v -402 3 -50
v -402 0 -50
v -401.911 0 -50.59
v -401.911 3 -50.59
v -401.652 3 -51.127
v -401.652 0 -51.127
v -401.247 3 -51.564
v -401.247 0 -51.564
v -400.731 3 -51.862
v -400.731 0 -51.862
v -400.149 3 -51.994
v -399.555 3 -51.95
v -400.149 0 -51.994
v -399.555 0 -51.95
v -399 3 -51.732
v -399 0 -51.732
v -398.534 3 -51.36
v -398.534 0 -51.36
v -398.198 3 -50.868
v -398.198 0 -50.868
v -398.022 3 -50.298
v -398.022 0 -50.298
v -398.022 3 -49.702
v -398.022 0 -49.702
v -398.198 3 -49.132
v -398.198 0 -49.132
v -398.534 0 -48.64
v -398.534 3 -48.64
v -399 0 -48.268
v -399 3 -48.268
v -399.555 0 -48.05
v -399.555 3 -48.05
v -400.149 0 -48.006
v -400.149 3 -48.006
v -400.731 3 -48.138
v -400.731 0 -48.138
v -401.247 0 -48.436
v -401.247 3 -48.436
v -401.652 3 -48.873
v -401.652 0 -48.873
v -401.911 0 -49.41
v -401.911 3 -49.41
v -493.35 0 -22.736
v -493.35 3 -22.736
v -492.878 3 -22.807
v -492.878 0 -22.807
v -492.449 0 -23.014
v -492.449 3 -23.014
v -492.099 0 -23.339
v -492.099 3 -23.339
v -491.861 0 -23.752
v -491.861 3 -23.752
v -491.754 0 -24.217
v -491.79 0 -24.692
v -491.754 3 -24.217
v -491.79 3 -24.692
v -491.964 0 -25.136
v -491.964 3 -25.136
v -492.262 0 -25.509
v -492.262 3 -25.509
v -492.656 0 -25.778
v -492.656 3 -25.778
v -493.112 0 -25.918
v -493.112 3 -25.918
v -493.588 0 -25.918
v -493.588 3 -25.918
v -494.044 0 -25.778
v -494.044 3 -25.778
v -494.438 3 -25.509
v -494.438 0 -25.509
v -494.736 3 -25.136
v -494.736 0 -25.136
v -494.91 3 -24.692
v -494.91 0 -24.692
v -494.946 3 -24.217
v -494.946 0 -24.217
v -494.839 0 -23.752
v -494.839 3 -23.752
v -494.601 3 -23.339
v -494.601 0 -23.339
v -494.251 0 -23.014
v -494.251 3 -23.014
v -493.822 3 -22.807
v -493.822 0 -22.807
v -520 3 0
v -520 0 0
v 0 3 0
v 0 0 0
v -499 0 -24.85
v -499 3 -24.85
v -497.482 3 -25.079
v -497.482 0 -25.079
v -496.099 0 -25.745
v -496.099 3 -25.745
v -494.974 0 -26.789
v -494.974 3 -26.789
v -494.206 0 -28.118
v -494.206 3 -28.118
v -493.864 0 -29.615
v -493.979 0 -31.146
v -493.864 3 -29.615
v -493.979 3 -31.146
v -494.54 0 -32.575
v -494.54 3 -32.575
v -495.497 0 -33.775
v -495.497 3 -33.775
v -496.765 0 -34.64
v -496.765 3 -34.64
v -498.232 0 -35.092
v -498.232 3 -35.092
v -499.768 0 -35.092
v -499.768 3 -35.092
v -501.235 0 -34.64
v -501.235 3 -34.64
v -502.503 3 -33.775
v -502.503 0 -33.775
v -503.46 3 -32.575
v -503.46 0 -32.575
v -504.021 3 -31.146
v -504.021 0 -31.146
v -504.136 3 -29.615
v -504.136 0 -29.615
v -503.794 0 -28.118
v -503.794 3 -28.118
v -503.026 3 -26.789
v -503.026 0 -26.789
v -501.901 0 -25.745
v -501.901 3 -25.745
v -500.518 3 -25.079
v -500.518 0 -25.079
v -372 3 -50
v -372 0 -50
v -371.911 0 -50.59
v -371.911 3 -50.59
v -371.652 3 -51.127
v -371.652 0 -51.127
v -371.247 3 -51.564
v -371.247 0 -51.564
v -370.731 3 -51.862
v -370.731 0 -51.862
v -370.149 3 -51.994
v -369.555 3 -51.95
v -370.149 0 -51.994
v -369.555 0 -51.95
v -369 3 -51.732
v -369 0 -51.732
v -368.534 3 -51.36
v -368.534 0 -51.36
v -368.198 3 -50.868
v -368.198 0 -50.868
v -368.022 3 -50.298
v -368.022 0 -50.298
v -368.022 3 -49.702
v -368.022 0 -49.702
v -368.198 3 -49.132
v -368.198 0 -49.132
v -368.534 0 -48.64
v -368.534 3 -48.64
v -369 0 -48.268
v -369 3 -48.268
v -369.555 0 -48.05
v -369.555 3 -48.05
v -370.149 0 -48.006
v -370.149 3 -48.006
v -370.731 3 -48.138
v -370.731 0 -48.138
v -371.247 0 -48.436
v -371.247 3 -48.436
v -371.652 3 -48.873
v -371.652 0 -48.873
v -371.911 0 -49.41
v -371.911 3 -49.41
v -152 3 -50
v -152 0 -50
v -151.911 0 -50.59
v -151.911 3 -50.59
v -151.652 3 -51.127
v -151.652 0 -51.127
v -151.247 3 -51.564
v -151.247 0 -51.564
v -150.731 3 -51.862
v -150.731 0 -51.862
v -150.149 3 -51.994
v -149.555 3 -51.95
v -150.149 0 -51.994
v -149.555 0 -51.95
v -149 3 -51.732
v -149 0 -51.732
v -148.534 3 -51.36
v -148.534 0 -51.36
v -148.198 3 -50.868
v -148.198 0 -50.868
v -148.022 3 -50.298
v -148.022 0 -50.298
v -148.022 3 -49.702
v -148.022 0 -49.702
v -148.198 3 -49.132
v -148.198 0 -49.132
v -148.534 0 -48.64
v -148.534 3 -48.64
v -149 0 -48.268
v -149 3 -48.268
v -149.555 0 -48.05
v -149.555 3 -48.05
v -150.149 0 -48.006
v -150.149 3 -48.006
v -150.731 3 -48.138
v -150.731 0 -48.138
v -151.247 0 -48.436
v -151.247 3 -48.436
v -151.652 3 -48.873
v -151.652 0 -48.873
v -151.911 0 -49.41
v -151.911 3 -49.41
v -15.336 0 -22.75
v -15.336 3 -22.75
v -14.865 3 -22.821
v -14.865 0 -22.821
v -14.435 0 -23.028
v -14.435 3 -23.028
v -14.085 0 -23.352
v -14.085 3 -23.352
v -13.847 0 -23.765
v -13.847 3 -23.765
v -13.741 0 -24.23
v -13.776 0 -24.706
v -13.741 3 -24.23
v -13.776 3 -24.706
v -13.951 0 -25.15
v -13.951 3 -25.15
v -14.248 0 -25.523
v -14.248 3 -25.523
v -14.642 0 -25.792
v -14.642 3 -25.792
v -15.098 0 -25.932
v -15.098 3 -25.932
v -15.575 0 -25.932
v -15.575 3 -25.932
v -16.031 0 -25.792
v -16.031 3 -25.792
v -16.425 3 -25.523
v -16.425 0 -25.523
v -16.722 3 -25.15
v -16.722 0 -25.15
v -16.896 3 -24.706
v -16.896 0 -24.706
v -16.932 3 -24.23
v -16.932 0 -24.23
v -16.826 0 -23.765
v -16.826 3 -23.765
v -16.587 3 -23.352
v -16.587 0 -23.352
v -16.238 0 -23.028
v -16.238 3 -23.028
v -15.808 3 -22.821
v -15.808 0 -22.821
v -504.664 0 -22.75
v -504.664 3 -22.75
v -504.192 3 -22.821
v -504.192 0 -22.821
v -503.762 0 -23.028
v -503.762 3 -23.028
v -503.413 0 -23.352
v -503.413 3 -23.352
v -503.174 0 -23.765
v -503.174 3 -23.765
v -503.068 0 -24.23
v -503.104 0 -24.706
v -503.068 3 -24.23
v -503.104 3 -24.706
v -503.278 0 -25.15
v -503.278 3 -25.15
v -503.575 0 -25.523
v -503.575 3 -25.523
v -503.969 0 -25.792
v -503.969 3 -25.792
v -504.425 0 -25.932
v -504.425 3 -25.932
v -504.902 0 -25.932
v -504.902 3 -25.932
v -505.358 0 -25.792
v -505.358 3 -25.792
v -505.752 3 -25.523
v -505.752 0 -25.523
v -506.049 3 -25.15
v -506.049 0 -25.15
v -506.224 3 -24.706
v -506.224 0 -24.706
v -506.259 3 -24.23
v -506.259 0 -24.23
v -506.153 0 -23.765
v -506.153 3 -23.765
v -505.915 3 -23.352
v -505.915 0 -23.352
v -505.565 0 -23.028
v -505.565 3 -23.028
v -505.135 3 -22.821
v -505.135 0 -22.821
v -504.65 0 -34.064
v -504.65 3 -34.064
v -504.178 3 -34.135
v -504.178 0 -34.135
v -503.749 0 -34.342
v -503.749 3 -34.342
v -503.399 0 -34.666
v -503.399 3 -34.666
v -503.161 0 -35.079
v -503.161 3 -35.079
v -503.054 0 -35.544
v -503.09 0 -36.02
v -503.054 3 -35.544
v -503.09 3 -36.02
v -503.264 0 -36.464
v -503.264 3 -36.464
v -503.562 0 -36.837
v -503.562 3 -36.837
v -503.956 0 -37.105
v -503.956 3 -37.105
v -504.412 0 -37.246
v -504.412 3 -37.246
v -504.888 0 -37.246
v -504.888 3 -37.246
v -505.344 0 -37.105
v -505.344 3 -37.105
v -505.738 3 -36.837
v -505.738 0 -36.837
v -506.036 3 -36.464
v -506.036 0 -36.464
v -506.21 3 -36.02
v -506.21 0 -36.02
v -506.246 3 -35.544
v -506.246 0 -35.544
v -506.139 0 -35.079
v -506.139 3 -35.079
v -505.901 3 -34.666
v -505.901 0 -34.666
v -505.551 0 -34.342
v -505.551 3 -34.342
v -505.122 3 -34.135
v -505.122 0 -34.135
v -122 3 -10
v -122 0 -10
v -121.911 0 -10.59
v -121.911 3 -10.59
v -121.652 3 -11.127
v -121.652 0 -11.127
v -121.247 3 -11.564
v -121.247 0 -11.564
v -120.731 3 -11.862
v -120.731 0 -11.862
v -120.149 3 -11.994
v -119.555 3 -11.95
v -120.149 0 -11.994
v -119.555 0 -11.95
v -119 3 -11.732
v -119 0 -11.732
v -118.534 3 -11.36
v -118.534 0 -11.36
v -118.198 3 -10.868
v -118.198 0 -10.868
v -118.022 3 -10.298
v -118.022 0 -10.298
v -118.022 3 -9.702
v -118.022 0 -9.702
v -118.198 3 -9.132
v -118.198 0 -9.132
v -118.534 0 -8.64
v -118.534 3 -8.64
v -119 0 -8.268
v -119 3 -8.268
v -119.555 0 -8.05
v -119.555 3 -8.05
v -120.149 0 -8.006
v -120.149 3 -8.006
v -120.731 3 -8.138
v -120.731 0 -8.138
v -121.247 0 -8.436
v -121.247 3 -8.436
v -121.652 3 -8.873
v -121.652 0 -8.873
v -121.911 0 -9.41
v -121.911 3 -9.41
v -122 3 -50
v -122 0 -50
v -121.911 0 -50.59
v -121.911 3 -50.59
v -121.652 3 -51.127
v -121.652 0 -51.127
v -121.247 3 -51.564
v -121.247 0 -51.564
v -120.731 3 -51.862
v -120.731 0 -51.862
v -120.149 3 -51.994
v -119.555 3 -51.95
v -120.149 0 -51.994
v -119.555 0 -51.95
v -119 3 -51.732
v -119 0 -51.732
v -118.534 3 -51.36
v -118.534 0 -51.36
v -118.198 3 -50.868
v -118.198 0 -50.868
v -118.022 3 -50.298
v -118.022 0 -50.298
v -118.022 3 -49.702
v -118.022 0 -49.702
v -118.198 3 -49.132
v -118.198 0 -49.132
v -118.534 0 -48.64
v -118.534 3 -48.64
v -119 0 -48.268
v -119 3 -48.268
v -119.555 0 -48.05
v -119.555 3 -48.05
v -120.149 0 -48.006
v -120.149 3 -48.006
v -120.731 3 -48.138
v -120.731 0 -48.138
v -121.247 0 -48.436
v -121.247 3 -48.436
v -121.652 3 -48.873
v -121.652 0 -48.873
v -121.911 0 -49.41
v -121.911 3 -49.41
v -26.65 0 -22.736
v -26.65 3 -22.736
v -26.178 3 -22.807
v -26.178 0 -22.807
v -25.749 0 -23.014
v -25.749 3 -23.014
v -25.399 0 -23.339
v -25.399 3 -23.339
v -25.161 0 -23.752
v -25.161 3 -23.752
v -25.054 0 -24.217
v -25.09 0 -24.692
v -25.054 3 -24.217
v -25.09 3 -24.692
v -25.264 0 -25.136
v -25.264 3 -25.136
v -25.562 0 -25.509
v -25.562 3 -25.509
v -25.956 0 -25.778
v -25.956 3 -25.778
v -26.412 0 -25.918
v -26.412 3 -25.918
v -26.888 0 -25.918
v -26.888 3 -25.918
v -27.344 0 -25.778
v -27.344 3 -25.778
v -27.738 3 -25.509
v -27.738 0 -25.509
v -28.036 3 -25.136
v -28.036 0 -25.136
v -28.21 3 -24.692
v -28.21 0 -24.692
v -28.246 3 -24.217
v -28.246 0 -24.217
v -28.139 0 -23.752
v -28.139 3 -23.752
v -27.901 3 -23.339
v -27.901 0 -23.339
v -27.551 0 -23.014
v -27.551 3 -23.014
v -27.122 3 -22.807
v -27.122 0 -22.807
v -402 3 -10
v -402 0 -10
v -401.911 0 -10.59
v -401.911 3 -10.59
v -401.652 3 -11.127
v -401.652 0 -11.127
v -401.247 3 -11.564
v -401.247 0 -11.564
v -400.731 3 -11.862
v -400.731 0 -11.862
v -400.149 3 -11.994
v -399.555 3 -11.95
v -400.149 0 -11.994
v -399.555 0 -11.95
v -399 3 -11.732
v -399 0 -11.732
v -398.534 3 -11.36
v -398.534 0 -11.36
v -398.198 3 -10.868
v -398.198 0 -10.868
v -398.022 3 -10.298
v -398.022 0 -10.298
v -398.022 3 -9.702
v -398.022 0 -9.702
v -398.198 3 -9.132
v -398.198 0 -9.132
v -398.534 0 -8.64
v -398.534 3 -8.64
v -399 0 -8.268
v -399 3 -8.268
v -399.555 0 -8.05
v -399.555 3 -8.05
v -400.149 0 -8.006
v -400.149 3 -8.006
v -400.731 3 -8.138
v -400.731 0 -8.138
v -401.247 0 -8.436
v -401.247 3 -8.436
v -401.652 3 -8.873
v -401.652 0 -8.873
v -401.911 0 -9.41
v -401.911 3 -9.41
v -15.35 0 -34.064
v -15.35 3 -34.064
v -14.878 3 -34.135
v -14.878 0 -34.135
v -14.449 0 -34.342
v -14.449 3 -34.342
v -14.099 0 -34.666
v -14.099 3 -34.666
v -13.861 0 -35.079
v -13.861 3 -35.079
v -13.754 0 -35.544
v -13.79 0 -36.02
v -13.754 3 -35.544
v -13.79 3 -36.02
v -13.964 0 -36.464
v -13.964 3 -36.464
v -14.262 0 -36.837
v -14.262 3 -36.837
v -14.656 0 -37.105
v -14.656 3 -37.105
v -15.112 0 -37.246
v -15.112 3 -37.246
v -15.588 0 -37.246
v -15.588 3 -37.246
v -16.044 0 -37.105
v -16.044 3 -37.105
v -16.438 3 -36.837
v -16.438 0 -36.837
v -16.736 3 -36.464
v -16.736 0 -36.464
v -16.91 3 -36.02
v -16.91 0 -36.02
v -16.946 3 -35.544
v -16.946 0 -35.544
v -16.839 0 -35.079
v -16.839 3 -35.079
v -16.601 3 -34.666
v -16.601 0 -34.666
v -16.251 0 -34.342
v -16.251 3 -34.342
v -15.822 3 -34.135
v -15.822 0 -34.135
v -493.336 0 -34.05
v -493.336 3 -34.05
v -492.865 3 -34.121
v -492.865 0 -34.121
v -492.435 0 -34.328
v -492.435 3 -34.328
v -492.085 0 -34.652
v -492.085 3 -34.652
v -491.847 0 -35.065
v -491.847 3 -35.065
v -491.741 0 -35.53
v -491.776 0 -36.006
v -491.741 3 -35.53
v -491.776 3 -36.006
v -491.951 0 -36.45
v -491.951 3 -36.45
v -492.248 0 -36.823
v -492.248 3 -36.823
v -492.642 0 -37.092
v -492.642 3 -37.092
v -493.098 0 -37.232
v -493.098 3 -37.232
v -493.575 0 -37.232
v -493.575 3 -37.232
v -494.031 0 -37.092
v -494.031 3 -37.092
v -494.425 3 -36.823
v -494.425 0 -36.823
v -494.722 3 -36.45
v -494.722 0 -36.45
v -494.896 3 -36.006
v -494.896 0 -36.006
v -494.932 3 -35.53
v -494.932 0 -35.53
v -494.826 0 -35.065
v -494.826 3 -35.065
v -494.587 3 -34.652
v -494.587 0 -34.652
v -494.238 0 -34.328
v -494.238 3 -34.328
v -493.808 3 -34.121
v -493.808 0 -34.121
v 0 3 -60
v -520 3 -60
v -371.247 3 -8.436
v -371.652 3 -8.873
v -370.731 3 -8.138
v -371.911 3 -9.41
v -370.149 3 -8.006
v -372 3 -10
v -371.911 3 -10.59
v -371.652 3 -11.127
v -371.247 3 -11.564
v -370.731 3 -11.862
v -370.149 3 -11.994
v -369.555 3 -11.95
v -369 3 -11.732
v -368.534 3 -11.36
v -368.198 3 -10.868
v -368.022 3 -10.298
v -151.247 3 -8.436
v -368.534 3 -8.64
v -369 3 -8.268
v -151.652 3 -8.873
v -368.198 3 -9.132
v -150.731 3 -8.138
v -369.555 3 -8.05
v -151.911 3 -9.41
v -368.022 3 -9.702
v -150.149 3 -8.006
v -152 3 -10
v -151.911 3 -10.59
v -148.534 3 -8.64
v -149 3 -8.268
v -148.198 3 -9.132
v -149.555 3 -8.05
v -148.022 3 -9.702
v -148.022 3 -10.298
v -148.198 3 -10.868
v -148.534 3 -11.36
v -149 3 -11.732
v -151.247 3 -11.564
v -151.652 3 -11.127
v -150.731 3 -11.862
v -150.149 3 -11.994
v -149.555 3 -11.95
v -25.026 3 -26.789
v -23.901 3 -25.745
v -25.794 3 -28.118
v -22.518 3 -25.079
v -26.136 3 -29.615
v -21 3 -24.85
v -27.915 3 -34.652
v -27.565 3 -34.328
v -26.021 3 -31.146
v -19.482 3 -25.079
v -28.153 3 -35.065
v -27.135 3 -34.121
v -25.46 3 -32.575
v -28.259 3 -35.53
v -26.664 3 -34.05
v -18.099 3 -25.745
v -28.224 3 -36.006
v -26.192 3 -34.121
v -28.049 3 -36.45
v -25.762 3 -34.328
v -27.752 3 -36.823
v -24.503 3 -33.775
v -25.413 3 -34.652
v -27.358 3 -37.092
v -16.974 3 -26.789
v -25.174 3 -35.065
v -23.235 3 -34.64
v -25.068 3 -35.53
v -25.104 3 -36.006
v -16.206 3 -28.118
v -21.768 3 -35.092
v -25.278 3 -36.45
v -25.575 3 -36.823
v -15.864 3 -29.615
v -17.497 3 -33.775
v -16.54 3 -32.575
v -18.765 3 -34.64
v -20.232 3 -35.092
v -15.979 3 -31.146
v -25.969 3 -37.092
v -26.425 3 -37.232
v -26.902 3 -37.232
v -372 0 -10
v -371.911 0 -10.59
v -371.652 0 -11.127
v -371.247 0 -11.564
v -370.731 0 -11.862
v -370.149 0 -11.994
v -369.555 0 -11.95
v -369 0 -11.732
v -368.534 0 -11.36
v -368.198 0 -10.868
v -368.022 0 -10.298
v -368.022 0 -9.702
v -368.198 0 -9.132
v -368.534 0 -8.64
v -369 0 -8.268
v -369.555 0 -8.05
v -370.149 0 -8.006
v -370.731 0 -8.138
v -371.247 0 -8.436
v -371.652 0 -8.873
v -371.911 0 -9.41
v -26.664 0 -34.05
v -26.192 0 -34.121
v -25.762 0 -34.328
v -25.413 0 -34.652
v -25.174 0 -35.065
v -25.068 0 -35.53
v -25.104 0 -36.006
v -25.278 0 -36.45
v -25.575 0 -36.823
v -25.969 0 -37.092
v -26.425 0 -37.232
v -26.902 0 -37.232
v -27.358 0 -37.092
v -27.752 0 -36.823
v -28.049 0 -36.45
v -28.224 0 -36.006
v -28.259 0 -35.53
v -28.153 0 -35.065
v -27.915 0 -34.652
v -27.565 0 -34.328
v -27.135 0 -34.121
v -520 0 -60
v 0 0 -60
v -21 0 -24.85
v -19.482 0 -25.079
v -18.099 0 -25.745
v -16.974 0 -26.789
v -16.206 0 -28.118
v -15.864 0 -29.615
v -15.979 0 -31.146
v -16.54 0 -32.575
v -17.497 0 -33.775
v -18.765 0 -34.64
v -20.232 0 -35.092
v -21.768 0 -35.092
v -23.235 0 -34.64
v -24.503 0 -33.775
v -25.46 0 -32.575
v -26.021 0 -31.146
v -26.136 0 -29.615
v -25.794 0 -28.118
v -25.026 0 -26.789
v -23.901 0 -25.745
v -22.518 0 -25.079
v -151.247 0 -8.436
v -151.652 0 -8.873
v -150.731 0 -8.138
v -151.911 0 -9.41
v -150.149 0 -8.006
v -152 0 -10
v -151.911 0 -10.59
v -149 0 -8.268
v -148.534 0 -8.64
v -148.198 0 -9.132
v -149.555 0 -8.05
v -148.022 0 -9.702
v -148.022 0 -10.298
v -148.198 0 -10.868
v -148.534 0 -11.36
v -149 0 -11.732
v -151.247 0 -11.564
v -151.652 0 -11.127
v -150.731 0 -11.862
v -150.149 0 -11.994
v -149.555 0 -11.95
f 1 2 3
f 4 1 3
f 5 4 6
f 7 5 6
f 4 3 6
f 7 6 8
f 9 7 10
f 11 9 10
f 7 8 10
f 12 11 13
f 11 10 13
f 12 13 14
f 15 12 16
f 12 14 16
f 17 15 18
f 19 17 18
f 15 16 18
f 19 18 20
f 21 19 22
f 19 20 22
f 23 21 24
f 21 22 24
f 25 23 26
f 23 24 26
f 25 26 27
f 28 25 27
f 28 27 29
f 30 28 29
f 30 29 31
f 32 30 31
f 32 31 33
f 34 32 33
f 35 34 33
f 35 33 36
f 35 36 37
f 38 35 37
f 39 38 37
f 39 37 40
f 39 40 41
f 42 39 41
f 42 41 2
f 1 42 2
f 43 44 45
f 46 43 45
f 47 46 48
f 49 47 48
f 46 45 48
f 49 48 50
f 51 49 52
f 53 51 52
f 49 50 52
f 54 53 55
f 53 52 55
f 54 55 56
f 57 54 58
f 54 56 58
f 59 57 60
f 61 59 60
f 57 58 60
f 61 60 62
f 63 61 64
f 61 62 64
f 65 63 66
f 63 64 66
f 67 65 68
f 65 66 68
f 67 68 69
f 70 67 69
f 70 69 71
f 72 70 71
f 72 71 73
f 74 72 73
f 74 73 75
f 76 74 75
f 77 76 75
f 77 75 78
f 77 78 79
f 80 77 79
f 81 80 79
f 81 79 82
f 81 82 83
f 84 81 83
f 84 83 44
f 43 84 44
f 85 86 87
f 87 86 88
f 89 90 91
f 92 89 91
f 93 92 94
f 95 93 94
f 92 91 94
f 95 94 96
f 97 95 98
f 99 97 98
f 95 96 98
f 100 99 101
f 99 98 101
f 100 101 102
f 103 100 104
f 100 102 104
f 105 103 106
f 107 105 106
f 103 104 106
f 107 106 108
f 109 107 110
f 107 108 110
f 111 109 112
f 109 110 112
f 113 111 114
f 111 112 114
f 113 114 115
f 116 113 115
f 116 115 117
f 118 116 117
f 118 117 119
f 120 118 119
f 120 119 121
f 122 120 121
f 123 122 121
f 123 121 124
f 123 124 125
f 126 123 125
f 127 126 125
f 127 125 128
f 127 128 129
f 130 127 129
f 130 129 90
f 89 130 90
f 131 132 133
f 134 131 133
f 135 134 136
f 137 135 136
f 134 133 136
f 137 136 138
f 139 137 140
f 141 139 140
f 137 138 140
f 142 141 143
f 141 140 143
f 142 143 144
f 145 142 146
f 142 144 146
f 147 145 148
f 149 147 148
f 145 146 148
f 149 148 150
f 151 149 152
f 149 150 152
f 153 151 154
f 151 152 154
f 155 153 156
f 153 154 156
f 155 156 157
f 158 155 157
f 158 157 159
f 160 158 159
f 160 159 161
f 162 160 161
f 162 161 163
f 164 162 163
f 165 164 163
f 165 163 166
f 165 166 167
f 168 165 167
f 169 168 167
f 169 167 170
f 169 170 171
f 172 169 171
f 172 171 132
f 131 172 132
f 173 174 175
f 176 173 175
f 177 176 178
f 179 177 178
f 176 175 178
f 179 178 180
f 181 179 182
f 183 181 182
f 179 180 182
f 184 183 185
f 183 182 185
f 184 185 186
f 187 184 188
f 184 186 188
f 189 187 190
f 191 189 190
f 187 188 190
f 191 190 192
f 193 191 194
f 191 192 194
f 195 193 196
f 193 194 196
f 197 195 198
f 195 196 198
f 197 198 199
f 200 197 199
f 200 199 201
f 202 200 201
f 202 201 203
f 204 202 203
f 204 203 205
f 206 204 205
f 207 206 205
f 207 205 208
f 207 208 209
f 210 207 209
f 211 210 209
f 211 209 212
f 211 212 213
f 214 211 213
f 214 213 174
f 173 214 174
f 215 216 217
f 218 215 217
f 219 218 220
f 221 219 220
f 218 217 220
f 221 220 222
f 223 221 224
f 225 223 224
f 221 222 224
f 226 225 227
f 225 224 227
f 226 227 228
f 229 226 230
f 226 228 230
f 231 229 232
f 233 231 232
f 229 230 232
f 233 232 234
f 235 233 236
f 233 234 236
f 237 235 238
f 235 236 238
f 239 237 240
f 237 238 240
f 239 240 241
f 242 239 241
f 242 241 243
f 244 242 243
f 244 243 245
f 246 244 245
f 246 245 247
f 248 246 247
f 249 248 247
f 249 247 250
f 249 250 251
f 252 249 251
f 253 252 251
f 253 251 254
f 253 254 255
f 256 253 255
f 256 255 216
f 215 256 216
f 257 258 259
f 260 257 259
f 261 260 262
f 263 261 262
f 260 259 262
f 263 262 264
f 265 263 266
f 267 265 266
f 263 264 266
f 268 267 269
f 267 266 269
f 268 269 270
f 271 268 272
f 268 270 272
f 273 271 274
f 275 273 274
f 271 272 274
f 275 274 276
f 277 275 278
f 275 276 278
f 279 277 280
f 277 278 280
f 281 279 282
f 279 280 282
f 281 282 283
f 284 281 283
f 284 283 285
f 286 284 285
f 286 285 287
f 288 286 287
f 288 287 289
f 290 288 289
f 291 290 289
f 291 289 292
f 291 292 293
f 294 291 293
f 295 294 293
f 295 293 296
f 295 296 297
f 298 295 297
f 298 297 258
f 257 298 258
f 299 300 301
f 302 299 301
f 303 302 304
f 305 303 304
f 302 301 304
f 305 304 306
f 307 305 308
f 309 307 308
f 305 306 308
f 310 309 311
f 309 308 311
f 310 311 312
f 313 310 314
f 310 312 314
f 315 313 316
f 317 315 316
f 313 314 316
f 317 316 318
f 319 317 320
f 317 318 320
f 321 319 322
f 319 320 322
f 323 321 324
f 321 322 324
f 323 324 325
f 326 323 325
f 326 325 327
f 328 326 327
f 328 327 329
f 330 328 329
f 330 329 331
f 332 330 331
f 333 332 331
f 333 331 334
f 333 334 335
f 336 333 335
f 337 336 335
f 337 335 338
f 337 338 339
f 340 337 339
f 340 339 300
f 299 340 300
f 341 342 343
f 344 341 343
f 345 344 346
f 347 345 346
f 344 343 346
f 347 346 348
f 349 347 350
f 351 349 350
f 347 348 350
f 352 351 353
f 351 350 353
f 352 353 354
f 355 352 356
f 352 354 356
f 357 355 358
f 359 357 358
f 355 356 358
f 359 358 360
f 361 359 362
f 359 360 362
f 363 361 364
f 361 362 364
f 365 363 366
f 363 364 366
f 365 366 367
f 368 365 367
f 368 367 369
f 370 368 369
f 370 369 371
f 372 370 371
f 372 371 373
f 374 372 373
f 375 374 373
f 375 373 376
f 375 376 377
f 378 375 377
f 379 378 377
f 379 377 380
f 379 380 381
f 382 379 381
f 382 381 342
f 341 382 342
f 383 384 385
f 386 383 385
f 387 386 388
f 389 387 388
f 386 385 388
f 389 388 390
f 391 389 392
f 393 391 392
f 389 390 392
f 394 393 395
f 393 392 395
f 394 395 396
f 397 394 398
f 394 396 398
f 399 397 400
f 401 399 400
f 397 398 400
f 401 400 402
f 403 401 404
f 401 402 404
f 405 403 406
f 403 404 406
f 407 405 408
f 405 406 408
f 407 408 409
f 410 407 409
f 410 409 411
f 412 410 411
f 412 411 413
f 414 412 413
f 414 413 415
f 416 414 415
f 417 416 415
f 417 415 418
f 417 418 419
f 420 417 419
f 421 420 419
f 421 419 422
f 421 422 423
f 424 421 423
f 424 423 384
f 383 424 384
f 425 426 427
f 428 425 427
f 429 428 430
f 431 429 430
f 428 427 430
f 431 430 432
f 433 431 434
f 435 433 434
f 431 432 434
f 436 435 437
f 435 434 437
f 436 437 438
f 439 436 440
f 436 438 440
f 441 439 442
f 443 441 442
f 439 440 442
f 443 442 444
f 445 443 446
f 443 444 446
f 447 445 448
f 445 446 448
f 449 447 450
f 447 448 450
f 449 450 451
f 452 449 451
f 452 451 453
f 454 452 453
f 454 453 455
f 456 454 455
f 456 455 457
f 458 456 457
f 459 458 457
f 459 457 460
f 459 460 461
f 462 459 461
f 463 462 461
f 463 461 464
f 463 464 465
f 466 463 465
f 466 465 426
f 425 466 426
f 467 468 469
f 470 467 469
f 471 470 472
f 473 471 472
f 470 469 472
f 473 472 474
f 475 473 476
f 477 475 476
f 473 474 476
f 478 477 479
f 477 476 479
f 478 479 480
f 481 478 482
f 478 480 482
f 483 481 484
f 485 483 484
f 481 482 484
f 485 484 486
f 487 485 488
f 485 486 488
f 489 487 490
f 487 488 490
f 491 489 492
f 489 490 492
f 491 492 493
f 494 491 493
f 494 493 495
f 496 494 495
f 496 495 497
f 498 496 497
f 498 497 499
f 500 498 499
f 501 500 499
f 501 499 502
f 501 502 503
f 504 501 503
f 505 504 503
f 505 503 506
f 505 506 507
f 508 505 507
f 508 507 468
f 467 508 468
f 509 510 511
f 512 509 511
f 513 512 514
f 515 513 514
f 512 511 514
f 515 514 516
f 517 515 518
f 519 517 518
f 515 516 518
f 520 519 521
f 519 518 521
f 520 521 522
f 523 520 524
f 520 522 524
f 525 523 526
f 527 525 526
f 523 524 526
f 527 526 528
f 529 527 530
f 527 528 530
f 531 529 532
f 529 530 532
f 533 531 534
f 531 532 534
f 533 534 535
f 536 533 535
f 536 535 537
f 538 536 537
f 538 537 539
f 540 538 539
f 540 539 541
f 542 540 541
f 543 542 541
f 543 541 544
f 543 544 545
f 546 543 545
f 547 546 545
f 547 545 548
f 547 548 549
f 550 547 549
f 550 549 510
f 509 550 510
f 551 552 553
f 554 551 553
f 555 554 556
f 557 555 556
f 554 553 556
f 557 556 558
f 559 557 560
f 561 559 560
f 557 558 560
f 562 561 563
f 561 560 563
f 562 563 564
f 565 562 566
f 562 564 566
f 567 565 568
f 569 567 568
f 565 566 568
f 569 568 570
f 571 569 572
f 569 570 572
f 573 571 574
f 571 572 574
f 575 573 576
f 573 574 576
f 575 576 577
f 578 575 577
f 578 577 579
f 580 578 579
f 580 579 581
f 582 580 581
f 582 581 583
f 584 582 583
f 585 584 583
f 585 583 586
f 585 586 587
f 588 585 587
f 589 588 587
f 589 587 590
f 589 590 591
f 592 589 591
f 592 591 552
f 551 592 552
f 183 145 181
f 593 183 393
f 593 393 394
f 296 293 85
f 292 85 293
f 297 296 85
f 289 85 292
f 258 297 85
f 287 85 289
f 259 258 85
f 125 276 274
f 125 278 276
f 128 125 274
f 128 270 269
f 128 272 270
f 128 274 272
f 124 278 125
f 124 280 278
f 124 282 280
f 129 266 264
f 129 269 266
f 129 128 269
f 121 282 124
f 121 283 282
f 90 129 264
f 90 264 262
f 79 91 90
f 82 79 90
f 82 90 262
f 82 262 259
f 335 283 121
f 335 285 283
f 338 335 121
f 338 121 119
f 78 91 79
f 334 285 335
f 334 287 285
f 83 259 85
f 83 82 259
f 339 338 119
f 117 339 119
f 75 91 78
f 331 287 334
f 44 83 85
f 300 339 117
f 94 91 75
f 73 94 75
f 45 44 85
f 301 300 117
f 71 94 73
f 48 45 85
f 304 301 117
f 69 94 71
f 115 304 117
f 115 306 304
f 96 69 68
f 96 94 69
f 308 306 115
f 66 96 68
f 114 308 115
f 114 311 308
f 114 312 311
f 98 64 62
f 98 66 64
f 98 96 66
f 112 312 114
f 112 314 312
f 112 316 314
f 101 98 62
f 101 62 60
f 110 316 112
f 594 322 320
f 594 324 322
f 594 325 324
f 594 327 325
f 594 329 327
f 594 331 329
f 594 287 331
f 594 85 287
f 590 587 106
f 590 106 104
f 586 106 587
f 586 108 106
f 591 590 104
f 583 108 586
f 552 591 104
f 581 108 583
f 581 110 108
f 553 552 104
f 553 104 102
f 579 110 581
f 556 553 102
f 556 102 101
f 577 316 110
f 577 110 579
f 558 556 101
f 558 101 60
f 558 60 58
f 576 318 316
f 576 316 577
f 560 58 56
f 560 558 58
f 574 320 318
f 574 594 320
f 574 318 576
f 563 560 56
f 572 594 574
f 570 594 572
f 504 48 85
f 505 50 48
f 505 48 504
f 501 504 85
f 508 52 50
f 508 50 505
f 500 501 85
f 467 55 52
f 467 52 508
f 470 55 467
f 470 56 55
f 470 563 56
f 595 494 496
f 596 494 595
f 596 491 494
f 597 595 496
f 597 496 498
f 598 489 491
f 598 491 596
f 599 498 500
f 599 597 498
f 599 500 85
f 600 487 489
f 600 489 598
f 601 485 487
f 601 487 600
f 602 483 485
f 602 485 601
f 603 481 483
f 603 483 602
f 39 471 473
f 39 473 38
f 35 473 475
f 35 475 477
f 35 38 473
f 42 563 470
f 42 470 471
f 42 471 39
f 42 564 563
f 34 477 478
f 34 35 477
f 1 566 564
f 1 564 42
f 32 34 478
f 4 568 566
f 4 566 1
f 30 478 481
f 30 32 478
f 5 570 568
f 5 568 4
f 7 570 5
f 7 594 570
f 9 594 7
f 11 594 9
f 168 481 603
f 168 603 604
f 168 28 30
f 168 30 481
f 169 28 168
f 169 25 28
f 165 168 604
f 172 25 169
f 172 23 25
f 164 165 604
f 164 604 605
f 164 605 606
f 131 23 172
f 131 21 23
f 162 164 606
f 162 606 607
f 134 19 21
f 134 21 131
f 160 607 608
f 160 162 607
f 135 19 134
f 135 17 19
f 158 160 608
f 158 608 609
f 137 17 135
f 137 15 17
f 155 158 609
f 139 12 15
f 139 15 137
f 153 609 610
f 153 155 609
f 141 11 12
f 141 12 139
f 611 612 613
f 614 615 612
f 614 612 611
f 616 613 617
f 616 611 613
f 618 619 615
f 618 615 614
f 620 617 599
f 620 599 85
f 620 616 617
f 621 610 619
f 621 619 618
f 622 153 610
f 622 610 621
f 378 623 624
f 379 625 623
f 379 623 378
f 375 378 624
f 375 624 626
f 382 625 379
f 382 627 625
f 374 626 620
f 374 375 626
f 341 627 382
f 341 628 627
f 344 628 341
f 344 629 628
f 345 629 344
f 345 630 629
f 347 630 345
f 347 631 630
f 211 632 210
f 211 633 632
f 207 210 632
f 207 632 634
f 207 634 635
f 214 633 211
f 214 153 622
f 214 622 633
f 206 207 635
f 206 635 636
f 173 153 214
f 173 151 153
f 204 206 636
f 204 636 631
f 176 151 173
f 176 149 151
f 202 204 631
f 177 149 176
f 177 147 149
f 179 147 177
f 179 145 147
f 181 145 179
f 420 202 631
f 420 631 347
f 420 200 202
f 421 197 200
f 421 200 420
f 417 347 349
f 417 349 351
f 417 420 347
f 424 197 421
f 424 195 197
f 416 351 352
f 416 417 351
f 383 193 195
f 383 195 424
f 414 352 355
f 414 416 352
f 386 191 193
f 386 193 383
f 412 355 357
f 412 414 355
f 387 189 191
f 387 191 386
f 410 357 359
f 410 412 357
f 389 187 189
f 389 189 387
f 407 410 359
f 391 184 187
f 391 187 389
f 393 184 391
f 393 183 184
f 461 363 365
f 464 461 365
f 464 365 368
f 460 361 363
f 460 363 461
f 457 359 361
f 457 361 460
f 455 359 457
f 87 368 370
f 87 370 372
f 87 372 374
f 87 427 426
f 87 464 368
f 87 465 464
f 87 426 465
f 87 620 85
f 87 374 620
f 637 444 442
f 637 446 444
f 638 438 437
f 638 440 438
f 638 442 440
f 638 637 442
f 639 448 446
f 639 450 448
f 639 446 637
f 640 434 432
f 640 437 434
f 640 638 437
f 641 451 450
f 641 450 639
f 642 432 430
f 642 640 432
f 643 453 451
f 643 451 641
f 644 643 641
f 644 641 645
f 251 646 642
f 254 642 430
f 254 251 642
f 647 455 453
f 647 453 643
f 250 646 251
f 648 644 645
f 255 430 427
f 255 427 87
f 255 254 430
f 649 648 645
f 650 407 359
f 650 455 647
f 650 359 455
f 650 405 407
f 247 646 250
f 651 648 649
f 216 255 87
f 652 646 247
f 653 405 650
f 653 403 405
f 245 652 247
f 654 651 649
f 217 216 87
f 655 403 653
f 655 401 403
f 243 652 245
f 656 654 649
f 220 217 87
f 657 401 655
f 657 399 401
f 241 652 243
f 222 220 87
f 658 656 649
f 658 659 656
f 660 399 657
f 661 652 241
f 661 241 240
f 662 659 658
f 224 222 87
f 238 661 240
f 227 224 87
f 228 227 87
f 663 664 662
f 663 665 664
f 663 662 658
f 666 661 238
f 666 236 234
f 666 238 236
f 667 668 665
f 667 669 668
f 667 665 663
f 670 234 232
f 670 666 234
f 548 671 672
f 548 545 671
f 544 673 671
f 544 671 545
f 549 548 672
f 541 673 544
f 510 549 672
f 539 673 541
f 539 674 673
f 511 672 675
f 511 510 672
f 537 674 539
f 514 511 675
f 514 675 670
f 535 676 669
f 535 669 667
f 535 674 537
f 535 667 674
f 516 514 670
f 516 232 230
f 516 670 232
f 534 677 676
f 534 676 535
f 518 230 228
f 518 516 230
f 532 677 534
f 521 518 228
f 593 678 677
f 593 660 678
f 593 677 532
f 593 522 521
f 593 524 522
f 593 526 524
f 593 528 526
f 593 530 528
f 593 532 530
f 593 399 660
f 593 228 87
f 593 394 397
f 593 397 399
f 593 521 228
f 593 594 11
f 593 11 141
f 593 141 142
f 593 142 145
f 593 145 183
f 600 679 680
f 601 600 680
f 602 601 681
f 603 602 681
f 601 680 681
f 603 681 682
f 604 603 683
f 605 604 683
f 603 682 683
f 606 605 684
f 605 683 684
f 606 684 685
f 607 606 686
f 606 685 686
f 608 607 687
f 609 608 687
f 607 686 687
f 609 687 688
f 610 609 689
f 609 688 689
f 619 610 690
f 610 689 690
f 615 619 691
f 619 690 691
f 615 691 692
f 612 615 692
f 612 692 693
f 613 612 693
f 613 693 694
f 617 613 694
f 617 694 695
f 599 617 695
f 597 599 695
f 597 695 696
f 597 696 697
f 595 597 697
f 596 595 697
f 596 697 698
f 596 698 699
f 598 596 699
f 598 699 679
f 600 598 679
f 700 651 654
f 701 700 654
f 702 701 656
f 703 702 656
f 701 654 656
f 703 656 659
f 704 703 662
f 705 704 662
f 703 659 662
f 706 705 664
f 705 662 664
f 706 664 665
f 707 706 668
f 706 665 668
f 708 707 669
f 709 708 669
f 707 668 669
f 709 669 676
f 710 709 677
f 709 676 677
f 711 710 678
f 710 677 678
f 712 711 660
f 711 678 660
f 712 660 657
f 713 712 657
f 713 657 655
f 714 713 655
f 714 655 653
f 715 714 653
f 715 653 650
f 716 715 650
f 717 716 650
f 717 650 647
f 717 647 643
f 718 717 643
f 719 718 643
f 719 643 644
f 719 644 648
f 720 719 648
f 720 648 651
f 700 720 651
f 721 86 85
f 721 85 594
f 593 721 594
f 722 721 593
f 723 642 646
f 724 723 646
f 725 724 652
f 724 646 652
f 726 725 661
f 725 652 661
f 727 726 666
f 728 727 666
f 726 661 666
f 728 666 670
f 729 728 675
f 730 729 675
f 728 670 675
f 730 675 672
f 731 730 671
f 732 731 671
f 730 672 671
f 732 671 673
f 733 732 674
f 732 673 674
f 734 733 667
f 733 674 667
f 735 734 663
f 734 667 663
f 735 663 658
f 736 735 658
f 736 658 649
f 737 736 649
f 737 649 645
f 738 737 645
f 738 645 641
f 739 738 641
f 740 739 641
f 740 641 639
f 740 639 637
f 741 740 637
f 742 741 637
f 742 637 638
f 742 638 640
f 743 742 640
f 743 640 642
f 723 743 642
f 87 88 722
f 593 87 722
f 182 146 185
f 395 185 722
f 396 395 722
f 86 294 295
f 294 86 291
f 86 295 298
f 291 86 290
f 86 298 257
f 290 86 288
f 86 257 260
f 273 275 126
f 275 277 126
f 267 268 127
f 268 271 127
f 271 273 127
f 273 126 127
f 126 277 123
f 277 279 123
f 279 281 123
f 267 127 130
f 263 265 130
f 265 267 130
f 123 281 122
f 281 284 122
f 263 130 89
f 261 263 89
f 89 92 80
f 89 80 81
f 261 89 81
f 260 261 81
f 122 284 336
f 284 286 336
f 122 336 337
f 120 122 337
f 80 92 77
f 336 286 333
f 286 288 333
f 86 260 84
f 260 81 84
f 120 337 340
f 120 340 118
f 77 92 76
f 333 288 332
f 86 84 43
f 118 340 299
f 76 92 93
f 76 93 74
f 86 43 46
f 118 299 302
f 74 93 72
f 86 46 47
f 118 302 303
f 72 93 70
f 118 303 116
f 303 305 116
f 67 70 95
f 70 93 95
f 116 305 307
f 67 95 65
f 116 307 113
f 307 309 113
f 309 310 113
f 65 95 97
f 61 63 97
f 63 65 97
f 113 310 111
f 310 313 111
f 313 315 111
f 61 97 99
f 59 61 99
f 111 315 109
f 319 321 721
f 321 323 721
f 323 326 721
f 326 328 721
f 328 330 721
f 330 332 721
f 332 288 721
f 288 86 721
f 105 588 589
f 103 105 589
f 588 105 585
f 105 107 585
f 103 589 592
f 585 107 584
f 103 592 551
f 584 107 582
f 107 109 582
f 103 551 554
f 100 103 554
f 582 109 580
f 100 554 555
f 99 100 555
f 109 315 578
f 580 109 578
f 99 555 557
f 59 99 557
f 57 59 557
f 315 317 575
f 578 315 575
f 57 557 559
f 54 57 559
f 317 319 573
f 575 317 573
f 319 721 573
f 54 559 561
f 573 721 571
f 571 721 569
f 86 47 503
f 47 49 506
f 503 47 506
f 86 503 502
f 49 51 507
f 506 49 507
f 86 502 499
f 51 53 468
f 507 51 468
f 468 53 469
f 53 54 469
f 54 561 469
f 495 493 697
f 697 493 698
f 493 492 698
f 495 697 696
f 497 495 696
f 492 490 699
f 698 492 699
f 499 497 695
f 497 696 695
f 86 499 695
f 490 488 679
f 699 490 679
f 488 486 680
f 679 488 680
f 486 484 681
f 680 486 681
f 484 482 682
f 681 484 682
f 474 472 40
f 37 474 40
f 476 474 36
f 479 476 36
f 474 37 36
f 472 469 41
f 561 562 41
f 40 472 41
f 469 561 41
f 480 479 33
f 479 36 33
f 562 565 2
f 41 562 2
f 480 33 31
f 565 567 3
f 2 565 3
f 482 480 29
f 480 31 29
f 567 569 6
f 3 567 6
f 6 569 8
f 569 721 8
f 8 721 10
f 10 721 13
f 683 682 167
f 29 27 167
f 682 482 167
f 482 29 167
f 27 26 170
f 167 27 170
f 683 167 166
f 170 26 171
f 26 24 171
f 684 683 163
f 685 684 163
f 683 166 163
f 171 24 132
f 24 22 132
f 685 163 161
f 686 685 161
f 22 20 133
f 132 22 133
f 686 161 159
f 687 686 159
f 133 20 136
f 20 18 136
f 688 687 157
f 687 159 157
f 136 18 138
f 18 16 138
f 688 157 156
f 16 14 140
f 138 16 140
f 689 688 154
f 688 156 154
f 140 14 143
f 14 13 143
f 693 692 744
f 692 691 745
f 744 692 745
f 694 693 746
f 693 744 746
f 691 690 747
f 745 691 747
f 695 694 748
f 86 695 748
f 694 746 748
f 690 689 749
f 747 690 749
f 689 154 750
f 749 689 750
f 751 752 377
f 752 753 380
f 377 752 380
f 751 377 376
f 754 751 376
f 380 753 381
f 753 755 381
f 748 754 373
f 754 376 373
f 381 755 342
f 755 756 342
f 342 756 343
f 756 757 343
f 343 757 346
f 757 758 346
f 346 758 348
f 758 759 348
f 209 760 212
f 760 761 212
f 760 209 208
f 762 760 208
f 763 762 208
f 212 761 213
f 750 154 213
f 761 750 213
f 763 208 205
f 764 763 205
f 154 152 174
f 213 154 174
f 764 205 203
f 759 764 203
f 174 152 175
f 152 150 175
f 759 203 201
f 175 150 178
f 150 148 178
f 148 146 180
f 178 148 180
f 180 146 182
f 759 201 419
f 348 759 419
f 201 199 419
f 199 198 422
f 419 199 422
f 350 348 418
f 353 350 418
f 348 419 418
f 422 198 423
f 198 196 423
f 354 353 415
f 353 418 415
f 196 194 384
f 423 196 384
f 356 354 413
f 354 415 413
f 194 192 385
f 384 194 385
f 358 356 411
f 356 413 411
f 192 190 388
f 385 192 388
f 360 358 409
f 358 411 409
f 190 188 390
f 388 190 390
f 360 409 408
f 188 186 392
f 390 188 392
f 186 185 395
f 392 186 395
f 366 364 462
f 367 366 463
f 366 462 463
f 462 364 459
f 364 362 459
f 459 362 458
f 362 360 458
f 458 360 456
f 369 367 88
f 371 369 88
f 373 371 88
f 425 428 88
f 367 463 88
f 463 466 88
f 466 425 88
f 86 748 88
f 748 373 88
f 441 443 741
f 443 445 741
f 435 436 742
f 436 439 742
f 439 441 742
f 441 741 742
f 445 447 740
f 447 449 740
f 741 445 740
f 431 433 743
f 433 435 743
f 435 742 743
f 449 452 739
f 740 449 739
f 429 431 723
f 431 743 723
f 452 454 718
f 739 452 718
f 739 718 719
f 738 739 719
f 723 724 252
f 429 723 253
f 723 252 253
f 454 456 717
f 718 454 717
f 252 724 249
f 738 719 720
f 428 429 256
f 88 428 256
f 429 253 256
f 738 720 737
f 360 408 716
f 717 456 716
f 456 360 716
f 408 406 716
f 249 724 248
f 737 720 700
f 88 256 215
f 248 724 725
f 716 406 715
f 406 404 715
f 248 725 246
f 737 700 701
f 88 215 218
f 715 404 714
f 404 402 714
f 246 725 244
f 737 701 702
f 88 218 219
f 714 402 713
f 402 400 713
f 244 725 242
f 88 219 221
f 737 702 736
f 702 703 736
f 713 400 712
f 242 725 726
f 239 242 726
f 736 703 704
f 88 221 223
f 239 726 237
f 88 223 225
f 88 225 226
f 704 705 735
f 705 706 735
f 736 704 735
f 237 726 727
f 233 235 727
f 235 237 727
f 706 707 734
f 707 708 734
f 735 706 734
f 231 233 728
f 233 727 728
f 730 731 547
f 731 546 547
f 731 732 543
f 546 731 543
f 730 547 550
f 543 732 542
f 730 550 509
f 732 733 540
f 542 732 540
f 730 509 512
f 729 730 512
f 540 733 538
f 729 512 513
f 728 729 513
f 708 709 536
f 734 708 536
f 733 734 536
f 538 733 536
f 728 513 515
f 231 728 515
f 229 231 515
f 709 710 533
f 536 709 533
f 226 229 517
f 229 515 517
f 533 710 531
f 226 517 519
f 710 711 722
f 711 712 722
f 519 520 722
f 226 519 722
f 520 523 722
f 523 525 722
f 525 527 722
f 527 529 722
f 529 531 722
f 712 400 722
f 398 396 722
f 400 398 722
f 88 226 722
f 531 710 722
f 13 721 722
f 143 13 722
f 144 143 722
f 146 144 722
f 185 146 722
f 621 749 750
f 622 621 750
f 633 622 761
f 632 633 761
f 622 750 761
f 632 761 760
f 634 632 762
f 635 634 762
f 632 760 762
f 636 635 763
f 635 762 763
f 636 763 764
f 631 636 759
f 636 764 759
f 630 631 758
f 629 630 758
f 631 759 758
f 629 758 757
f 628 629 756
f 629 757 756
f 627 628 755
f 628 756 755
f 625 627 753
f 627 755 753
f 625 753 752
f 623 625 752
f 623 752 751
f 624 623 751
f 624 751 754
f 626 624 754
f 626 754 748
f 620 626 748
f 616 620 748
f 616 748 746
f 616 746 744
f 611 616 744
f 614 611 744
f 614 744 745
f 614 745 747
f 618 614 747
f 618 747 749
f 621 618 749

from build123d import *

# Parameters (mm, degrees)
SZKIC1_W                    = 520
SZKIC1_H                    = 60
DODANIE_WYCI_GNI_CIE1_DEPTH = 3
OTW_R_POD_RUB_M41_D         = 4
SZKIC8_R                    = 5.15
WYTNIJ_WYCI_GNI_CIE1_DEPTH  = 10
SZKIC9_R                    = 1.6
WYTNIJ_WYCI_GNI_CIE2_DEPTH  = 524.45868987
SZKIC10_R                   = 1.6
WYTNIJ_WYCI_GNI_CIE3_DEPTH  = 10


with BuildPart() as part:
    # Szkic1 → Dodanie-wyciągnięcie1 (new body)
    with BuildSketch(Plane(origin=(0, 0, 0), x_dir=(1, 0, 0), z_dir=(0, 1, 0))):
        with Locations((-260, 30)):
            Rectangle(SZKIC1_W, SZKIC1_H)
    extrude(amount=DODANIE_WYCI_GNI_CIE1_DEPTH)

    # Otwór pod śrubę M41 (through all)
    with Locations(Plane(origin=(0, 3, 0), x_dir=(1, 0, 0), z_dir=(0, 1, 0))):
        with Locations((-400, 50), (-370, 50), (-400, 10), (-370, 10), (-150, 50), (-120, 50), (-150, 10), (-120, 10)):
            Hole(OTW_R_POD_RUB_M41_D / 2)

    # Szkic8 → Wytnij-wyciągnięcie1 (cut)
    with BuildSketch(Plane(origin=(0, 3, 0), x_dir=(1, 0, 0), z_dir=(0, 1, 0))):
        with Locations(Location((-21, 30, 0), (0, 0, 270))):
            Circle(SZKIC8_R)
        with Locations(Location((-499, 30, 0), (0, 0, 270))):
            Circle(SZKIC8_R)
    extrude(amount=-WYTNIJ_WYCI_GNI_CIE1_DEPTH, mode=Mode.SUBTRACT)

    # Szkic9 → Wytnij-wyciągnięcie2 (cut, through all)
    with BuildSketch(Plane(origin=(0, 3, 0), x_dir=(1, 0, 0), z_dir=(0, 1, 0))):
        with Locations(Location((-504.65, 35.663700204, 0), (0, 0, 270))):
            Circle(SZKIC9_R)
        with Locations(Location((-493.336299796, 35.65, 0), (0, 0, 270))):
            Circle(SZKIC9_R)
        with Locations(Location((-493.35, 24.336299796, 0), (0, 0, 270))):
            Circle(SZKIC9_R)
        with Locations(Location((-504.663700204, 24.35, 0), (0, 0, 270))):
            Circle(SZKIC9_R)
    extrude(amount=-WYTNIJ_WYCI_GNI_CIE2_DEPTH, mode=Mode.SUBTRACT)

    # Szkic10 → Wytnij-wyciągnięcie3 (cut)
    with BuildSketch(Plane(origin=(0, 3, 0), x_dir=(1, 0, 0), z_dir=(0, 1, 0))):
        with Locations(Location((-15.35, 35.663700204, 0), (0, 0, 270))):
            Circle(SZKIC10_R)
        with Locations(Location((-15.336299796, 24.35, 0), (0, 0, 270))):
            Circle(SZKIC10_R)
        with Locations(Location((-26.65, 24.336299796, 0), (0, 0, 270))):
            Circle(SZKIC10_R)
        with Locations(Location((-26.663700204, 35.65, 0), (0, 0, 270))):
            Circle(SZKIC10_R)
    extrude(amount=-WYTNIJ_WYCI_GNI_CIE3_DEPTH, mode=Mode.SUBTRACT)


solid = part.part
